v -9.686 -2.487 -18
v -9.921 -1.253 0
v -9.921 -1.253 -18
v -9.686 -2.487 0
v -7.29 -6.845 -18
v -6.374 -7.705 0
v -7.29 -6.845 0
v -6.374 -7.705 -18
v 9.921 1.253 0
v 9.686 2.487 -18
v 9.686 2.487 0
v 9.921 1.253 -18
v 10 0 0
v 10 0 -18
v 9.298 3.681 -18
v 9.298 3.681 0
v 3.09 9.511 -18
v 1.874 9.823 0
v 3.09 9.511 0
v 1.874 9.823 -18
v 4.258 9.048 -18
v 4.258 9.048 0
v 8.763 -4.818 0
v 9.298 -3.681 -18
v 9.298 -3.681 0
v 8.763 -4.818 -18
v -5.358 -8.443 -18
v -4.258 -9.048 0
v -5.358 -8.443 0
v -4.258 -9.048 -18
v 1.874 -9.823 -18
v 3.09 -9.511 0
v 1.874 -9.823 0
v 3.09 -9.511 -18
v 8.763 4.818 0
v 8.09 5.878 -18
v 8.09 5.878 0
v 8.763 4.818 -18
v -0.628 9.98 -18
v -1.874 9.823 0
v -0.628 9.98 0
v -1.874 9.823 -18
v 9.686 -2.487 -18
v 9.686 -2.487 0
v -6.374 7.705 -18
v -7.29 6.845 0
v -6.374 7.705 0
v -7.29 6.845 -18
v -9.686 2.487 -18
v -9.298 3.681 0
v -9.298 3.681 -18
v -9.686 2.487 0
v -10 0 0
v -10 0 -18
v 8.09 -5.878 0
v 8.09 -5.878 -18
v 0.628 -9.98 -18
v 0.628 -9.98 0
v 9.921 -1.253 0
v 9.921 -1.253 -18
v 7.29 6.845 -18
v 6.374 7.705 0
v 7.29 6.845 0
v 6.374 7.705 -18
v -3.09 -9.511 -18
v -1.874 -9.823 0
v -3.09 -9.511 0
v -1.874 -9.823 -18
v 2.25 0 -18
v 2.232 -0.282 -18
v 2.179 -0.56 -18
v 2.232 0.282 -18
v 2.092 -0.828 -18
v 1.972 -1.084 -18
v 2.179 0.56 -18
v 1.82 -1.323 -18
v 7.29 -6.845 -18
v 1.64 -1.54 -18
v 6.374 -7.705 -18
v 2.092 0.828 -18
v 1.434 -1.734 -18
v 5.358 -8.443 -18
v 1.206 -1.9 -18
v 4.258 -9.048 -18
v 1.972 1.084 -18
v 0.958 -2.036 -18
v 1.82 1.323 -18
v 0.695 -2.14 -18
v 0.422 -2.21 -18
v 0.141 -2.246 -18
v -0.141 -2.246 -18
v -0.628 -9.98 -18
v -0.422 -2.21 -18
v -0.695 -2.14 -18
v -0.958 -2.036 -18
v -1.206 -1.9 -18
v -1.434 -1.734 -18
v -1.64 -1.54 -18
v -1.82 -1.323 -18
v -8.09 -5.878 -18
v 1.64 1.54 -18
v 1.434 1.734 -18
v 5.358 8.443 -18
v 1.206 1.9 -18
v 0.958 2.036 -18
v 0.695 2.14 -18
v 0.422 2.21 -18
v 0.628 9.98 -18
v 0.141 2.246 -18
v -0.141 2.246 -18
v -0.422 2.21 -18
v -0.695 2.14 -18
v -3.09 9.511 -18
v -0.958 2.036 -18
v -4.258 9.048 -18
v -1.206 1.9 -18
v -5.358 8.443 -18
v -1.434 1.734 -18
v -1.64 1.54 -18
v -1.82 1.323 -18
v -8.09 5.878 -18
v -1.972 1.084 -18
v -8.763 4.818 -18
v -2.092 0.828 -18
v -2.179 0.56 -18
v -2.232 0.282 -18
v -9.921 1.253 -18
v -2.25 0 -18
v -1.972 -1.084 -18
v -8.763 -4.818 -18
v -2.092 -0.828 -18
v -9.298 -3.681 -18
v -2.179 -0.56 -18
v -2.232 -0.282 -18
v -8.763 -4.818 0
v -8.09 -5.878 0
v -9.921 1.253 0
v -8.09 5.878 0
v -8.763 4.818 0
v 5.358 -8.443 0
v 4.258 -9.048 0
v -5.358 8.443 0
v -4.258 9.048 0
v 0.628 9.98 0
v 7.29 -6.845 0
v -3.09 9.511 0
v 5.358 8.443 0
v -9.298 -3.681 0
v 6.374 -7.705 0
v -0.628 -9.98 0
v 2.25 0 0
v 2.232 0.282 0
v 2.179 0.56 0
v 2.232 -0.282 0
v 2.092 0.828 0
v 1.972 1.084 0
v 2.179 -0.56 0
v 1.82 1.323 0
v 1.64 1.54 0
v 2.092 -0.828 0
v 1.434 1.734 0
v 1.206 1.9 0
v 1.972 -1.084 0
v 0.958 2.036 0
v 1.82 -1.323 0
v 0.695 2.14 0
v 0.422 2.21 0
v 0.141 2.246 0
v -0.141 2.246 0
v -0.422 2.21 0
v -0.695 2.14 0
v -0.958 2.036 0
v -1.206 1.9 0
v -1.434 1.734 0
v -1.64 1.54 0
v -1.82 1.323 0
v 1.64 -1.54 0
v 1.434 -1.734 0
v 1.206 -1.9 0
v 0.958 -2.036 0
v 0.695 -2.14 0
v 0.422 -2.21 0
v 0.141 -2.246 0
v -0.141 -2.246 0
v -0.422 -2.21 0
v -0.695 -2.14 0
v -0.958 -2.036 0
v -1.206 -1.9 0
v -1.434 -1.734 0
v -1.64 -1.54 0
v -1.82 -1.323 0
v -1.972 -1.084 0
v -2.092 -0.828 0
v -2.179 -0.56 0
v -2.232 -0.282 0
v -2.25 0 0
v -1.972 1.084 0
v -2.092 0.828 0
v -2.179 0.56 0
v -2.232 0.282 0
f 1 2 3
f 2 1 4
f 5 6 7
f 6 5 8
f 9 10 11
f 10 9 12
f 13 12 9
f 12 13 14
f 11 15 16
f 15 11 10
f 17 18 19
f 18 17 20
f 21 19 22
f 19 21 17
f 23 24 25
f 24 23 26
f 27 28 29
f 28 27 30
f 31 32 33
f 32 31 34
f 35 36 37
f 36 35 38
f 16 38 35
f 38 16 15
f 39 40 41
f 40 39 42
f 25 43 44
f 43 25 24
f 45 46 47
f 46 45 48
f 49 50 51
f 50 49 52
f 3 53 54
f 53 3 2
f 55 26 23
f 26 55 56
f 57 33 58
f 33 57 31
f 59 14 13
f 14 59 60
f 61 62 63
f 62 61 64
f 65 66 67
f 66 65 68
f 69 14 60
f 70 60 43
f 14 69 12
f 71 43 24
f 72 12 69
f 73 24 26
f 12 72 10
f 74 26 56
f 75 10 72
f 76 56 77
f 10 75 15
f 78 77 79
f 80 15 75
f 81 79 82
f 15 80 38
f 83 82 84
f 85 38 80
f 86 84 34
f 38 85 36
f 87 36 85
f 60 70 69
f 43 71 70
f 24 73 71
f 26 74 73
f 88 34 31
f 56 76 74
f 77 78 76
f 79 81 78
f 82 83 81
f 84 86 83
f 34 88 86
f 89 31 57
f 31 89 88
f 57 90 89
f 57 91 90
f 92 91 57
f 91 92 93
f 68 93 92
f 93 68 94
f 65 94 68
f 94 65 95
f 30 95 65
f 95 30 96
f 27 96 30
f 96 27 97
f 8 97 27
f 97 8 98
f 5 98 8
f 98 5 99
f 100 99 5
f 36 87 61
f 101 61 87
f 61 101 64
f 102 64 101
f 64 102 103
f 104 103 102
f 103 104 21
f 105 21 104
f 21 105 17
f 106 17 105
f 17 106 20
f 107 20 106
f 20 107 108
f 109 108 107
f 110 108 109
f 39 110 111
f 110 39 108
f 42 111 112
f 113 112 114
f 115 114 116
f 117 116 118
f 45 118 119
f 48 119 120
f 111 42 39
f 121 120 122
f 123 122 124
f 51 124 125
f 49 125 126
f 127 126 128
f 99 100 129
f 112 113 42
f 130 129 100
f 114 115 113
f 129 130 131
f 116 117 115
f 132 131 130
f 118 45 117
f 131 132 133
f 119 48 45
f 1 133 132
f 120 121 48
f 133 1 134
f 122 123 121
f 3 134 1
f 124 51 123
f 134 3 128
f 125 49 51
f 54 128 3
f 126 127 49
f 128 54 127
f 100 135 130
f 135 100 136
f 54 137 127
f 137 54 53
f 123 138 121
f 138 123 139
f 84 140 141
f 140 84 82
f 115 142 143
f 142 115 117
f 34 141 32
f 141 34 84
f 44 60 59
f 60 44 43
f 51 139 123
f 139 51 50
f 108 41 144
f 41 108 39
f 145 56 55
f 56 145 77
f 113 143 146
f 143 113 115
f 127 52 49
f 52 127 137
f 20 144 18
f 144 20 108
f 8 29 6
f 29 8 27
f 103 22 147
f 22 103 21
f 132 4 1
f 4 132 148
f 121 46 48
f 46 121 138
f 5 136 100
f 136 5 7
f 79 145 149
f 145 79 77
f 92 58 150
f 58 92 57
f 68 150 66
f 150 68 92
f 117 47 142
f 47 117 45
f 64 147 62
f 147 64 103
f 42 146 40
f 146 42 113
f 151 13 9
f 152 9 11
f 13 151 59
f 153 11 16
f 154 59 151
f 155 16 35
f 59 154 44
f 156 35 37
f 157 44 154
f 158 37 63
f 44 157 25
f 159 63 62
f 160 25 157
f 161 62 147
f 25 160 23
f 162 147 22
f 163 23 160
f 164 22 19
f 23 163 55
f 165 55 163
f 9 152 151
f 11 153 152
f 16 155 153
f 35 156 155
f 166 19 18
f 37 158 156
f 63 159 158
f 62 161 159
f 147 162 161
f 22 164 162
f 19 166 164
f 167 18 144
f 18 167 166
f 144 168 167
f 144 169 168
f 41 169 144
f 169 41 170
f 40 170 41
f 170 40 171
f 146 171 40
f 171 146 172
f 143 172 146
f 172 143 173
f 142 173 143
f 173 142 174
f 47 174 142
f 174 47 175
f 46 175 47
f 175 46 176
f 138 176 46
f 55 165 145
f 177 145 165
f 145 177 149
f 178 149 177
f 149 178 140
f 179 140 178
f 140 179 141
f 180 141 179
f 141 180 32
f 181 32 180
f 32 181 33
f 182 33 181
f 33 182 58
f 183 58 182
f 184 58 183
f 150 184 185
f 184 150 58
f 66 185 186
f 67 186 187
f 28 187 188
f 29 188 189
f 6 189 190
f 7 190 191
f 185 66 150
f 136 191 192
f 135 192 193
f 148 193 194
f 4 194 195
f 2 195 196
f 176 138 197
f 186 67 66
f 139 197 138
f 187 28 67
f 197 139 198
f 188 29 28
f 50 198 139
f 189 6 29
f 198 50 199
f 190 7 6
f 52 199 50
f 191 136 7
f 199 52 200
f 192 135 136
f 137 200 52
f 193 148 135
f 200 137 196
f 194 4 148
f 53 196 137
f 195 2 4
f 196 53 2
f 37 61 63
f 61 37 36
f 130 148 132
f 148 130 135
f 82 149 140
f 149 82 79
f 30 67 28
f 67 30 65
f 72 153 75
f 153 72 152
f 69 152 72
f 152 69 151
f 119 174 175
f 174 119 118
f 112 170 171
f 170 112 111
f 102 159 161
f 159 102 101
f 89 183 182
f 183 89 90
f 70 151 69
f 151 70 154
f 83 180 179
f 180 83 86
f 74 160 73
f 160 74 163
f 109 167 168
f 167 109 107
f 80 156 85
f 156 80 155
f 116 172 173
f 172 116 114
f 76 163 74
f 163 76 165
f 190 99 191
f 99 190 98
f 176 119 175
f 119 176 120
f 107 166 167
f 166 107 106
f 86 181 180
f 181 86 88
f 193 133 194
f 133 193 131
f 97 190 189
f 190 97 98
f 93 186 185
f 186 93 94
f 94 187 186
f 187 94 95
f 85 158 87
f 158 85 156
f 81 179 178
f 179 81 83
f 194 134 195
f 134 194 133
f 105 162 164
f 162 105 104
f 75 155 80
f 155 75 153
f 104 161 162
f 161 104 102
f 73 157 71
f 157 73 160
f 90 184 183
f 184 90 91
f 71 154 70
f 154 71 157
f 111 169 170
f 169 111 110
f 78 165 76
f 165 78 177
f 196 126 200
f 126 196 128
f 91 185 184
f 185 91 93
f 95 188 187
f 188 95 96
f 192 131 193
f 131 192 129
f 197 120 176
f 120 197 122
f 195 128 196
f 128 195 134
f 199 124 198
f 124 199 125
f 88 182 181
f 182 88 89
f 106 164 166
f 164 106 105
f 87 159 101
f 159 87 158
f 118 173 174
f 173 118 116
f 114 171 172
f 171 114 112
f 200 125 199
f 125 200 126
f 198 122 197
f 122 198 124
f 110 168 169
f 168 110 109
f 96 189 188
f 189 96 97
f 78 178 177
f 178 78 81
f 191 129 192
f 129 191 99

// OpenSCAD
$fn = 50;


difference() {
	union() {
		translate(v = [0, 0, -18.0000000000]) {
			cylinder(h = 18, r = 10.0000000000);
		}
		cylinder(h = 0, r = 13.0000000000);
	}
	union() {
		#translate(v = [0, 0, -18]) {
			cylinder(h = 18, r = 2.2500000000);
		}
	}
}
